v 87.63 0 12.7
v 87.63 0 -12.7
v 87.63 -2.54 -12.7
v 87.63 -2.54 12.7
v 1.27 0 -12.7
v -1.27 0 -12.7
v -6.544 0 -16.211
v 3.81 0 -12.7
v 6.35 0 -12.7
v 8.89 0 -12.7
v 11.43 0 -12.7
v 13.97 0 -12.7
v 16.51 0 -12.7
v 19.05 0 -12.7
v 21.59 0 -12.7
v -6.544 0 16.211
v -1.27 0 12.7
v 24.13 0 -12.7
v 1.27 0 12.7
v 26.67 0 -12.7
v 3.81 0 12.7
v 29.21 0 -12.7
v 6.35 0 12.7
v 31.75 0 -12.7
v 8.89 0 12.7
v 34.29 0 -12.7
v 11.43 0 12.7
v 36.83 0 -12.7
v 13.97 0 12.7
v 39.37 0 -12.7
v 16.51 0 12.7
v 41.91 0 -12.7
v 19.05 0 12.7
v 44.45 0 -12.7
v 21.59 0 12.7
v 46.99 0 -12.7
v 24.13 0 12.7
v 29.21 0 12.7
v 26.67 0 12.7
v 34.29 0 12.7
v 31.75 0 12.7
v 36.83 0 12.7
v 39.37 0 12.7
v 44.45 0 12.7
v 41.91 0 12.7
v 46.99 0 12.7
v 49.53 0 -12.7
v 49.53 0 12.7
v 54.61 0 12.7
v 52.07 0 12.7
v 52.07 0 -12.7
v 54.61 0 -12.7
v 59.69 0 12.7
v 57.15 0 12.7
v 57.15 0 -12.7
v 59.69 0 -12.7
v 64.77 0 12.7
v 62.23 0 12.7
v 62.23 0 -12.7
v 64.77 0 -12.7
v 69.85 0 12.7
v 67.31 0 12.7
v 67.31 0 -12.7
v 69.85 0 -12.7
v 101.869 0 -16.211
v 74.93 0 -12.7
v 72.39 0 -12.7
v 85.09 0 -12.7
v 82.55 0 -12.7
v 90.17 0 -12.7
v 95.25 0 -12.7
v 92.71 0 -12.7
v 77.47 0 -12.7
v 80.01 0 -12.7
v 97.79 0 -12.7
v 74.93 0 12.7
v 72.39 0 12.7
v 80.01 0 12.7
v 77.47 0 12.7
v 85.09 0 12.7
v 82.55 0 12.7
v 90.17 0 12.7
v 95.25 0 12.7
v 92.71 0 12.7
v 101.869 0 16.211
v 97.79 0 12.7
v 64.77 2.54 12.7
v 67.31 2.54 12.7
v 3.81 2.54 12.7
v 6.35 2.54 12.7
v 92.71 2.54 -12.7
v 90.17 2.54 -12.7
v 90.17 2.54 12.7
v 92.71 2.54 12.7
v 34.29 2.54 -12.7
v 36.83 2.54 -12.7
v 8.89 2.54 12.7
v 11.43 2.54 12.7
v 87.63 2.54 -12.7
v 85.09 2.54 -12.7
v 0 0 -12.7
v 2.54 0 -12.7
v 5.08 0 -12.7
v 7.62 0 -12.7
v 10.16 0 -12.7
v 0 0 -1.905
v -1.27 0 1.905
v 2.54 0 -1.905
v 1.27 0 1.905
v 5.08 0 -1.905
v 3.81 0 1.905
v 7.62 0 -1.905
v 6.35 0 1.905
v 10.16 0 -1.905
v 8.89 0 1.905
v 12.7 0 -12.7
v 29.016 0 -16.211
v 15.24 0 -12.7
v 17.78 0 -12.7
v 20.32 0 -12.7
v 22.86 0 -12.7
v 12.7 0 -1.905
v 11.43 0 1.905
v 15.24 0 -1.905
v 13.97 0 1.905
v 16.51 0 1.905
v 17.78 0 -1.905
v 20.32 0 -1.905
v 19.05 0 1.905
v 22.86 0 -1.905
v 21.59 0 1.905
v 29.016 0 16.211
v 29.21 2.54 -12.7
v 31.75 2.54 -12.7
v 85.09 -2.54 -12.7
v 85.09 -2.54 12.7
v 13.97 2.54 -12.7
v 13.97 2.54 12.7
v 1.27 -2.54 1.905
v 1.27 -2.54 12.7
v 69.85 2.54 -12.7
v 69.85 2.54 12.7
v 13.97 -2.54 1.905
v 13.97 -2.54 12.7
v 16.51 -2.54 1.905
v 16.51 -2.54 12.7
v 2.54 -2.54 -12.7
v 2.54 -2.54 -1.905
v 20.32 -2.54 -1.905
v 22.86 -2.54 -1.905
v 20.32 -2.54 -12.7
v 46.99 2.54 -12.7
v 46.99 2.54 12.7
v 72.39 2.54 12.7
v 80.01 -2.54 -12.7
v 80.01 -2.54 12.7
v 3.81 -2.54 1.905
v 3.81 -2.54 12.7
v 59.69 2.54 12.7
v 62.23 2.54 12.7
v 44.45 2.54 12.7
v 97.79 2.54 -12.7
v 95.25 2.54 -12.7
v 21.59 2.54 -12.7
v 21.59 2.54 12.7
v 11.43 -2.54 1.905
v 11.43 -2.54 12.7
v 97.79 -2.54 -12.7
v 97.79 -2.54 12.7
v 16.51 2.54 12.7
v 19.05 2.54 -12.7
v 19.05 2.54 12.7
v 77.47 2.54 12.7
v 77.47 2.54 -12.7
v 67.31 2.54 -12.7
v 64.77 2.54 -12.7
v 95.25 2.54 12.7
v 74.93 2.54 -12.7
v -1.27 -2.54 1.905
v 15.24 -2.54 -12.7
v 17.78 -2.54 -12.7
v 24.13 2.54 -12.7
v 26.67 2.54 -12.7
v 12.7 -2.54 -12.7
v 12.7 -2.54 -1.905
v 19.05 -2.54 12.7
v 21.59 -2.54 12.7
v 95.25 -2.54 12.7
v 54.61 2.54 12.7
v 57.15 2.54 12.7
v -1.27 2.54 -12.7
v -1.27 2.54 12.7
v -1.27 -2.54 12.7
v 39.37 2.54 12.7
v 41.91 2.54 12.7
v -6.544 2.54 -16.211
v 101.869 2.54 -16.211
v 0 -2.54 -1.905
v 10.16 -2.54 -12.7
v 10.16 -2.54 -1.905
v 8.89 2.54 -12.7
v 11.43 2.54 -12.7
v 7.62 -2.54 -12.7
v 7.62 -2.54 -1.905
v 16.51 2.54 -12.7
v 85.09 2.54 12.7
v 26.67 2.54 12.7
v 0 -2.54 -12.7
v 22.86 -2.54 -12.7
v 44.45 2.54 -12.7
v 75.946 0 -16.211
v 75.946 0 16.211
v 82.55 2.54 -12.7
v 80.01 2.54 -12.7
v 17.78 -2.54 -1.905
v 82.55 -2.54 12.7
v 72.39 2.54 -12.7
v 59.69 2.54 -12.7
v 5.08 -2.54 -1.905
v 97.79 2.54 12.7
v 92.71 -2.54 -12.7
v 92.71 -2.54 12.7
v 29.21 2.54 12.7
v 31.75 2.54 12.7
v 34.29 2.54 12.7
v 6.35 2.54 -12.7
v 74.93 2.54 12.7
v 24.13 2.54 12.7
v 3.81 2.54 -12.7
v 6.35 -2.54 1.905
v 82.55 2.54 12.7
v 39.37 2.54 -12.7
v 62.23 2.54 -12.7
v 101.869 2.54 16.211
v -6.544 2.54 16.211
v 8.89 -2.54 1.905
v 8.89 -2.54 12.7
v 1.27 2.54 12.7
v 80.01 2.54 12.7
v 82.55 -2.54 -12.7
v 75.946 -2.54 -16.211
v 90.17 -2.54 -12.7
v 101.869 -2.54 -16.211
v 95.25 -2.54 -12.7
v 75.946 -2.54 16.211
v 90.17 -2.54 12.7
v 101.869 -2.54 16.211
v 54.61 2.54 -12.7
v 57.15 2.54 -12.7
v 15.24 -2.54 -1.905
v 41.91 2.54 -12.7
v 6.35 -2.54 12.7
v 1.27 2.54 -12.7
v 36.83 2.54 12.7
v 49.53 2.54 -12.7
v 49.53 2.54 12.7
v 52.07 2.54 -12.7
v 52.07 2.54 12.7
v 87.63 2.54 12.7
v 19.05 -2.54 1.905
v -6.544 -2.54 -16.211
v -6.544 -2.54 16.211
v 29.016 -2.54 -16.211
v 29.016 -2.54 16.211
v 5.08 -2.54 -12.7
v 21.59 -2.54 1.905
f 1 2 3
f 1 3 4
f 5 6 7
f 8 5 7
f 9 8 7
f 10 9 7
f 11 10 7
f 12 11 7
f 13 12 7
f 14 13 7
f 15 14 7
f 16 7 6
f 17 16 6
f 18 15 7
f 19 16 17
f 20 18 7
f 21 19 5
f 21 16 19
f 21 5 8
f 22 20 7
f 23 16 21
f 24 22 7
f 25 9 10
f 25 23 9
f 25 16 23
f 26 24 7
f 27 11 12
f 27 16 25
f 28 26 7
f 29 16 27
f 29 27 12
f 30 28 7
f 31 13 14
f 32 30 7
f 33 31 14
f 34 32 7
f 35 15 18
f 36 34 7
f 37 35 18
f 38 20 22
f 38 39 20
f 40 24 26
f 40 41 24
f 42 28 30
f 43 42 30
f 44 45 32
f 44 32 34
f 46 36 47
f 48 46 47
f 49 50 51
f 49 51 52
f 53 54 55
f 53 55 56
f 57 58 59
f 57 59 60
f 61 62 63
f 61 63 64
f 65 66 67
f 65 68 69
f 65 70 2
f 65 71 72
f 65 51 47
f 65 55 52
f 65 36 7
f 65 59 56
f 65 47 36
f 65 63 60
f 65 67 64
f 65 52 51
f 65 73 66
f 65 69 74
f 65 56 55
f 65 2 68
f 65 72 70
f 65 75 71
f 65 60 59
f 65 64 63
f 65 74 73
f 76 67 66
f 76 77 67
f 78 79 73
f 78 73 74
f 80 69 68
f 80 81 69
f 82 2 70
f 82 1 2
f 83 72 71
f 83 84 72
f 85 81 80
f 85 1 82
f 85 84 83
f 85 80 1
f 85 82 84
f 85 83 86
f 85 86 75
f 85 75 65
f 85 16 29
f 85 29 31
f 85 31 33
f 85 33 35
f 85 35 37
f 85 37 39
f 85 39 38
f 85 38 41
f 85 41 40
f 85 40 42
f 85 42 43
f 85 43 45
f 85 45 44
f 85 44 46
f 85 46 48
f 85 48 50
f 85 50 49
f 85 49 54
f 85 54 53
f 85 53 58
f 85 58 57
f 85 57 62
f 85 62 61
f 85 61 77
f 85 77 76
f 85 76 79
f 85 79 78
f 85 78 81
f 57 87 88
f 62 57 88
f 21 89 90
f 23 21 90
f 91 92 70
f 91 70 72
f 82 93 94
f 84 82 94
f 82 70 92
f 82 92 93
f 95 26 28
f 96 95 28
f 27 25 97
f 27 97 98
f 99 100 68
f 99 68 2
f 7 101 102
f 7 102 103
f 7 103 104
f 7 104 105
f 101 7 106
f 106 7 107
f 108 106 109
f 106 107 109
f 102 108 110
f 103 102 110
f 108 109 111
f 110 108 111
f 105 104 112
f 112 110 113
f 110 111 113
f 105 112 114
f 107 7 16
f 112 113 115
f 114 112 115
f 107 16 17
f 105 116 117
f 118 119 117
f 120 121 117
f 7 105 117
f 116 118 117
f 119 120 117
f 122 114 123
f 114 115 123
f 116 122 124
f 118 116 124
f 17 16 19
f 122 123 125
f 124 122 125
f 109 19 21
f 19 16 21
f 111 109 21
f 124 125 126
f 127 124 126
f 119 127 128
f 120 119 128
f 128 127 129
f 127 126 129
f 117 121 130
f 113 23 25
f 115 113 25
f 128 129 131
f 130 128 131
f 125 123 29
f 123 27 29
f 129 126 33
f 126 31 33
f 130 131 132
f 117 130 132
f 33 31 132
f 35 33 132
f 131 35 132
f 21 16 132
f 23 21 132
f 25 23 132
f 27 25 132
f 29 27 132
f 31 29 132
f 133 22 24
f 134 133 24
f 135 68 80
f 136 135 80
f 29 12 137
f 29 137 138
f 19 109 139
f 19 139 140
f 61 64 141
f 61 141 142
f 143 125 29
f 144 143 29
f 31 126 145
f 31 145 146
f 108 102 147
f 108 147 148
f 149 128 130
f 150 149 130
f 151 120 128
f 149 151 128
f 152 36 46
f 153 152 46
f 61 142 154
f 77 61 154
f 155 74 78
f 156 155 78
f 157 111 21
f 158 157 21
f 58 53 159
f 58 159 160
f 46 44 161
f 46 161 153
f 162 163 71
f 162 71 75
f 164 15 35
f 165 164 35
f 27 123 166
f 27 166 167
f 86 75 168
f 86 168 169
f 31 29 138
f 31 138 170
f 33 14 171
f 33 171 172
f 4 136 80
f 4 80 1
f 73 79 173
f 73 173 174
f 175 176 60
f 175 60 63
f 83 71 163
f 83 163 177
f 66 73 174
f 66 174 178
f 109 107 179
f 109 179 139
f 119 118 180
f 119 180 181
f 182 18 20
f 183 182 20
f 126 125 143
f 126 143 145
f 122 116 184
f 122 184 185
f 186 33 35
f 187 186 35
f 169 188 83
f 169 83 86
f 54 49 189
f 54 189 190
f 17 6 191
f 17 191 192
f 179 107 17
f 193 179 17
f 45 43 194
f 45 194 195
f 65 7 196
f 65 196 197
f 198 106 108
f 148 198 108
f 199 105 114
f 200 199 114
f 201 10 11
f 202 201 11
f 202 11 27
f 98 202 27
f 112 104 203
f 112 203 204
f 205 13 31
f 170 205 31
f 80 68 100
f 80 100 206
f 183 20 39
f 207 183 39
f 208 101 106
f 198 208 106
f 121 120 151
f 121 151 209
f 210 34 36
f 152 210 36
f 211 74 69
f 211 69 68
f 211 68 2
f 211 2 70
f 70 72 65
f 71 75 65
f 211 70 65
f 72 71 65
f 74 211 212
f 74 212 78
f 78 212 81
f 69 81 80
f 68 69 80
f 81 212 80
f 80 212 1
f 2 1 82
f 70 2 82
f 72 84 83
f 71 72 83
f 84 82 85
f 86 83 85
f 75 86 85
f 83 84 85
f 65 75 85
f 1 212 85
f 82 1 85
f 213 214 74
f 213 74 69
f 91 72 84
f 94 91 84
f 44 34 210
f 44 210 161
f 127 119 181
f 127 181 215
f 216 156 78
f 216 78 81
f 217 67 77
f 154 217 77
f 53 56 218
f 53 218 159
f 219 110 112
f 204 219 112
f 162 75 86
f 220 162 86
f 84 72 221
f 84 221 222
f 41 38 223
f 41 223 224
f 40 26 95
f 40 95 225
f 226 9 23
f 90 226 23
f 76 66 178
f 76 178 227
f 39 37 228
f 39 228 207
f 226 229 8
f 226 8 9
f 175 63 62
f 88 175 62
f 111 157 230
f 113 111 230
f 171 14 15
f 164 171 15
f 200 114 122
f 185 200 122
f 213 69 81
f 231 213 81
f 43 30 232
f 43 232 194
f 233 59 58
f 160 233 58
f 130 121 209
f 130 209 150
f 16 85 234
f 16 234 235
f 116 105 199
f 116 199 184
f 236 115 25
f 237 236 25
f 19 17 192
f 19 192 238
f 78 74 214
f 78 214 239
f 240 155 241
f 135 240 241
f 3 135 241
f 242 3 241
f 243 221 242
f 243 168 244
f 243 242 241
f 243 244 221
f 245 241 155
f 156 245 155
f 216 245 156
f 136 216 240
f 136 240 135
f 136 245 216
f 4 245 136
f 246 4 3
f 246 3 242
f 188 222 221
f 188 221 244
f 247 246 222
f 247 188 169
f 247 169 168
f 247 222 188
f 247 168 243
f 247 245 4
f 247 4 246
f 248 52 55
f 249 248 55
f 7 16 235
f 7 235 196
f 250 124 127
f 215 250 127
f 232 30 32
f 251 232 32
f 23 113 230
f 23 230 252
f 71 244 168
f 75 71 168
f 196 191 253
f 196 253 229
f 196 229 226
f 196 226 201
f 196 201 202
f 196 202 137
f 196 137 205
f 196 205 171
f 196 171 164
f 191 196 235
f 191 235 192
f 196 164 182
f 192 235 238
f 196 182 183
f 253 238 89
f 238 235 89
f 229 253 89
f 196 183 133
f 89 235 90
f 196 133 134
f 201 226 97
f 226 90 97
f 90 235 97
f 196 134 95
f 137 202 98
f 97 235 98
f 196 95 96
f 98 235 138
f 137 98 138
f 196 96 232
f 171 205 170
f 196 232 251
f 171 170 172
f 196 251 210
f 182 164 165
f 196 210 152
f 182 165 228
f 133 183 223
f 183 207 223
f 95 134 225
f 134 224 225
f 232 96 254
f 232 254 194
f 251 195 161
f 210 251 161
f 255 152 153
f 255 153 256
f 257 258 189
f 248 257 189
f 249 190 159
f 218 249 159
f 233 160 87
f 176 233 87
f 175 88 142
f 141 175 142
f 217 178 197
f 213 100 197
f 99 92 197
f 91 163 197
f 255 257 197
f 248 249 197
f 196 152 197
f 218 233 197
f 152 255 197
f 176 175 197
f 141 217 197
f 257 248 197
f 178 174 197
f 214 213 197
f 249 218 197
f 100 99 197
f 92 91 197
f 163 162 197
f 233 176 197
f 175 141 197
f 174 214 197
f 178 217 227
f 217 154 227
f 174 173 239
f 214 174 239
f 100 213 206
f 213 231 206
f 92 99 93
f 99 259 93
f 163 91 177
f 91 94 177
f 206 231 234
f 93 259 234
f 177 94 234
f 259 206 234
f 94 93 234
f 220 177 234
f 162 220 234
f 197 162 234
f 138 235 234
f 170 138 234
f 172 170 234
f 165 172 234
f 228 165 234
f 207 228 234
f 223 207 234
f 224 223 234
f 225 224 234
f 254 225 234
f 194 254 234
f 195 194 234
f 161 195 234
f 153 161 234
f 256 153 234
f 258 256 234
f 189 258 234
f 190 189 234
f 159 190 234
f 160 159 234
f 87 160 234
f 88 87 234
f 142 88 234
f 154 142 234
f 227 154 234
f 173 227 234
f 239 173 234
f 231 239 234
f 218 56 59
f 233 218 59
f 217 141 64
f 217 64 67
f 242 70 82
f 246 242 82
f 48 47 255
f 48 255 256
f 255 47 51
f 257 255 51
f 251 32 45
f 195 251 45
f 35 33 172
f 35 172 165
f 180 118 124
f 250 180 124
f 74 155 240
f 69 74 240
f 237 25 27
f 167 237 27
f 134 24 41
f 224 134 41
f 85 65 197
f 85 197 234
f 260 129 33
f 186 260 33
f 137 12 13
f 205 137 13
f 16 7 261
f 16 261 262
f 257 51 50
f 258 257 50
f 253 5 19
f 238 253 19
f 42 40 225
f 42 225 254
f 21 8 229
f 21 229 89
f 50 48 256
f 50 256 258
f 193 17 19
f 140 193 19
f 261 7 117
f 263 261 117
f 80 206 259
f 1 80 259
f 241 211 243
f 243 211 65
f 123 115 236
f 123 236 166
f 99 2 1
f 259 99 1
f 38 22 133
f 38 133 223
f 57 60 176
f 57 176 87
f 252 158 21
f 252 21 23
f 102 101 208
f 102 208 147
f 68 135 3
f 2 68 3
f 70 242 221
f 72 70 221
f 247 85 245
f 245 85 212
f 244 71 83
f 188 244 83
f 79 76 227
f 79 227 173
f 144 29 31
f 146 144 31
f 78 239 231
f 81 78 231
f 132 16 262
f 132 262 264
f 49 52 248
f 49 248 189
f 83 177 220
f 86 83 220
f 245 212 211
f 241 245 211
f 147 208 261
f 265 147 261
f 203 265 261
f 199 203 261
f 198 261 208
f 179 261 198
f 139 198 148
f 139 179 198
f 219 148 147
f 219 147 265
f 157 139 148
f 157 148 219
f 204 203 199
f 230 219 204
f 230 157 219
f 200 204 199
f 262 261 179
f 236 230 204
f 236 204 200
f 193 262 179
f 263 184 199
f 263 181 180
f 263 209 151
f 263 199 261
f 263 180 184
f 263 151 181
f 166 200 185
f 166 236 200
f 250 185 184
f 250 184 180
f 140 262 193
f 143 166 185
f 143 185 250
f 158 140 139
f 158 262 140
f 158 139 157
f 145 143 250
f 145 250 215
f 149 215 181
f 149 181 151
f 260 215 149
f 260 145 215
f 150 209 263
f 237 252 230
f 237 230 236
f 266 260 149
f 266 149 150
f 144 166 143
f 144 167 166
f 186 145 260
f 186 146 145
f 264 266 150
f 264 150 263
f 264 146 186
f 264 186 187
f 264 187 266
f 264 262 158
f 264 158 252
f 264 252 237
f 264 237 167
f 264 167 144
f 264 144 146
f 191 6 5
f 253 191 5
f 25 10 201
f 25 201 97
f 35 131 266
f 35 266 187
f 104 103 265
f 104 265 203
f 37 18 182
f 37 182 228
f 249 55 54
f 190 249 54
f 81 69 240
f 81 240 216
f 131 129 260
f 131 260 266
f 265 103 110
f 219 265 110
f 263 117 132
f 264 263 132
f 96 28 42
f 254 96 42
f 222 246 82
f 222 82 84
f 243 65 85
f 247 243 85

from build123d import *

# Parameters (mm, degrees)
F0_W     = 2.54
F0_H     = 25.4
F1_DEPTH = 2.54
F0_W_2   = 1.524
F2_DEPTH = 2.54
F3_W     = 35.56
F3_H     = 32.422354
F3_W_2   = 2.54
F3_H_2   = 10.795
F4_DEPTH = 2.54


with BuildPart() as f1:
    # F0 (on Front) → F1 (new body)
    with BuildSketch(Plane.XZ):
        Polygon((74.93, 12.7), (75.946, 12.7), (75.946, 16.211176), (-6.544235, 16.211176), (-6.544235, -16.211178), (75.946, -16.211178), (75.946, -12.7), (74.93, -12.7), align=None)
        Rectangle(F0_W, F0_H, mode=Mode.SUBTRACT)
        with Locations((5.08, 0)):
            Rectangle(F0_W, F0_H, mode=Mode.SUBTRACT)
        with Locations((10.16, 0)):
            Rectangle(F0_W, F0_H, mode=Mode.SUBTRACT)
        with Locations((15.24, 0)):
            Rectangle(F0_W, F0_H, mode=Mode.SUBTRACT)
        with Locations((20.32, 0)):
            Rectangle(F0_W, F0_H, mode=Mode.SUBTRACT)
        with Locations((25.4, 0)):
            Rectangle(F0_W, F0_H, mode=Mode.SUBTRACT)
        with Locations((30.48, 0)):
            Rectangle(F0_W, F0_H, mode=Mode.SUBTRACT)
        with Locations((35.56, 0)):
            Rectangle(F0_W, F0_H, mode=Mode.SUBTRACT)
        with Locations((40.64, 0)):
            Rectangle(F0_W, F0_H, mode=Mode.SUBTRACT)
        with Locations((45.72, 0)):
            Rectangle(F0_W, F0_H, mode=Mode.SUBTRACT)
        with Locations((50.8, 0)):
            Rectangle(F0_W, F0_H, mode=Mode.SUBTRACT)
        with Locations((55.88, 0)):
            Rectangle(F0_W, F0_H, mode=Mode.SUBTRACT)
        with Locations((60.96, 0)):
            Rectangle(F0_W, F0_H, mode=Mode.SUBTRACT)
        with Locations((66.04, 0)):
            Rectangle(F0_W, F0_H, mode=Mode.SUBTRACT)
        with Locations((71.12, 0)):
            Rectangle(F0_W, F0_H, mode=Mode.SUBTRACT)
        Polygon((75.946, 12.7), (77.47, 12.7), (77.47, -12.7), (75.946, -12.7), (75.946, -16.211178), (101.868942, -16.211178), (101.868942, 16.211176), (75.946, 16.211176), align=None)
        with Locations((81.28, 0)):
            Rectangle(F0_W, F0_H, mode=Mode.SUBTRACT)
        with Locations((86.36, 0)):
            Rectangle(F0_W, F0_H, mode=Mode.SUBTRACT)
        with Locations((91.44, 0)):
            Rectangle(F0_W, F0_H, mode=Mode.SUBTRACT)
        with Locations((96.52, 0)):
            Rectangle(F0_W, F0_H, mode=Mode.SUBTRACT)
    extrude(amount=-F1_DEPTH)


with BuildPart() as f2:
    # F0 (on Front) → F2 (new body)
    with BuildSketch(Plane.XZ):
        Polygon((75.946, 12.7), (77.47, 12.7), (77.47, -12.7), (75.946, -12.7), (75.946, -16.211178), (101.868942, -16.211178), (101.868942, 16.211176), (75.946, 16.211176), align=None)
        with Locations((81.28, 0)):
            Rectangle(F0_W, F0_H, mode=Mode.SUBTRACT)
        with Locations((86.36, 0)):
            Rectangle(F0_W, F0_H, mode=Mode.SUBTRACT)
        with Locations((91.44, 0)):
            Rectangle(F0_W, F0_H, mode=Mode.SUBTRACT)
        with Locations((96.52, 0)):
            Rectangle(F0_W, F0_H, mode=Mode.SUBTRACT)
        with Locations((76.708, 0)):
            Rectangle(F0_W_2, F0_H)
    extrude(amount=F2_DEPTH)


with BuildPart() as f4:
    # F3 (on Front) → F4 (new body)
    with BuildSketch(Plane.XZ):
        with Locations((11.235765, -1e-06)):
            Rectangle(F3_W, F3_H)
        with Locations((1.27, -7.3025)):
            Rectangle(F3_W_2, F3_H_2, mode=Mode.SUBTRACT)
        with Locations((6.35, -7.3025)):
            Rectangle(F3_W_2, F3_H_2, mode=Mode.SUBTRACT)
        with Locations((11.43, -7.3025)):
            Rectangle(F3_W_2, F3_H_2, mode=Mode.SUBTRACT)
        with Locations((16.51, -7.3025)):
            Rectangle(F3_W_2, F3_H_2, mode=Mode.SUBTRACT)
        with Locations((21.59, -7.3025)):
            Rectangle(F3_W_2, F3_H_2, mode=Mode.SUBTRACT)
        with Locations((0, 7.3025)):
            Rectangle(F3_W_2, F3_H_2, mode=Mode.SUBTRACT)
        with Locations((5.08, 7.3025)):
            Rectangle(F3_W_2, F3_H_2, mode=Mode.SUBTRACT)
        with Locations((10.16, 7.3025)):
            Rectangle(F3_W_2, F3_H_2, mode=Mode.SUBTRACT)
        with Locations((15.24, 7.3025)):
            Rectangle(F3_W_2, F3_H_2, mode=Mode.SUBTRACT)
        with Locations((20.32, 7.3025)):
            Rectangle(F3_W_2, F3_H_2, mode=Mode.SUBTRACT)
    extrude(amount=F4_DEPTH)


solid = Compound([f1.part, f2.part, f4.part])
